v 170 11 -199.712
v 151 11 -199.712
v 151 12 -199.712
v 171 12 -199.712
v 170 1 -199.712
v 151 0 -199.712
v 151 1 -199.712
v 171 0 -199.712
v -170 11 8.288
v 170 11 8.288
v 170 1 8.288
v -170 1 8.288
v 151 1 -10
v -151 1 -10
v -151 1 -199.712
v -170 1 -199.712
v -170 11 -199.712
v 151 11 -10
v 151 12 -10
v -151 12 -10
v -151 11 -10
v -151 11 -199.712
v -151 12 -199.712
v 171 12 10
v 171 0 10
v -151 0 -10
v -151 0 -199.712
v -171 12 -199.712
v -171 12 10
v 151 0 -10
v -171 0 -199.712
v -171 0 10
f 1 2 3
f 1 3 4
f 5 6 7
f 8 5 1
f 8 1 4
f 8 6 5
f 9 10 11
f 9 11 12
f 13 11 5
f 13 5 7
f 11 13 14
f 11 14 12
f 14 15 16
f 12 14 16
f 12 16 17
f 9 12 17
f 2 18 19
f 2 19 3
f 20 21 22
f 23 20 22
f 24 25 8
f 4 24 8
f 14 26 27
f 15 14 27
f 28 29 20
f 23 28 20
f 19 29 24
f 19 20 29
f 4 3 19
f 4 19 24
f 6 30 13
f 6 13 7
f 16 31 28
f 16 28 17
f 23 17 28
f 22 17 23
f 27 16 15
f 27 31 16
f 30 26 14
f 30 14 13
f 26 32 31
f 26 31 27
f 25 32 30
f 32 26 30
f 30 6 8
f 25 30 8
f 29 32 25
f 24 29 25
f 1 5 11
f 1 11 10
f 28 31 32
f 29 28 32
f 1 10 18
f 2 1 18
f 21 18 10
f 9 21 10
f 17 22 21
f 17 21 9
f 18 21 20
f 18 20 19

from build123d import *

# Parameters (mm, degrees)
SALIENTE_EXTRUIR2_DEPTH = 12
CROQUIS3_W              = 340
CROQUIS3_H              = 10
CORTAR_EXTRUIR1_DEPTH   = 208


with BuildPart() as part:
    # Croquis2 → Saliente-Extruir2 (new body)
    with BuildSketch(Plane(origin=(0, 0, 0), x_dir=(1, 0, 0), z_dir=(0, 1, 0))):
        Polygon((-171, -10), (171, -10), (171, 199.712394883), (151, 199.712394883), (151, 10), (-151, 10), (-151, 199.712394883), (-171, 199.712394883), align=None)
    extrude(amount=SALIENTE_EXTRUIR2_DEPTH)

    # Croquis3 → Cortar-Extruir1 (cut)
    with BuildSketch(Plane(origin=(0, 0, -199.712394883), x_dir=(-1, 0, 0), z_dir=(0, 0, -1))):
        with Locations((0, 6)):
            Rectangle(CROQUIS3_W, CROQUIS3_H)
    extrude(amount=-CORTAR_EXTRUIR1_DEPTH, mode=Mode.SUBTRACT)


solid = part.part
